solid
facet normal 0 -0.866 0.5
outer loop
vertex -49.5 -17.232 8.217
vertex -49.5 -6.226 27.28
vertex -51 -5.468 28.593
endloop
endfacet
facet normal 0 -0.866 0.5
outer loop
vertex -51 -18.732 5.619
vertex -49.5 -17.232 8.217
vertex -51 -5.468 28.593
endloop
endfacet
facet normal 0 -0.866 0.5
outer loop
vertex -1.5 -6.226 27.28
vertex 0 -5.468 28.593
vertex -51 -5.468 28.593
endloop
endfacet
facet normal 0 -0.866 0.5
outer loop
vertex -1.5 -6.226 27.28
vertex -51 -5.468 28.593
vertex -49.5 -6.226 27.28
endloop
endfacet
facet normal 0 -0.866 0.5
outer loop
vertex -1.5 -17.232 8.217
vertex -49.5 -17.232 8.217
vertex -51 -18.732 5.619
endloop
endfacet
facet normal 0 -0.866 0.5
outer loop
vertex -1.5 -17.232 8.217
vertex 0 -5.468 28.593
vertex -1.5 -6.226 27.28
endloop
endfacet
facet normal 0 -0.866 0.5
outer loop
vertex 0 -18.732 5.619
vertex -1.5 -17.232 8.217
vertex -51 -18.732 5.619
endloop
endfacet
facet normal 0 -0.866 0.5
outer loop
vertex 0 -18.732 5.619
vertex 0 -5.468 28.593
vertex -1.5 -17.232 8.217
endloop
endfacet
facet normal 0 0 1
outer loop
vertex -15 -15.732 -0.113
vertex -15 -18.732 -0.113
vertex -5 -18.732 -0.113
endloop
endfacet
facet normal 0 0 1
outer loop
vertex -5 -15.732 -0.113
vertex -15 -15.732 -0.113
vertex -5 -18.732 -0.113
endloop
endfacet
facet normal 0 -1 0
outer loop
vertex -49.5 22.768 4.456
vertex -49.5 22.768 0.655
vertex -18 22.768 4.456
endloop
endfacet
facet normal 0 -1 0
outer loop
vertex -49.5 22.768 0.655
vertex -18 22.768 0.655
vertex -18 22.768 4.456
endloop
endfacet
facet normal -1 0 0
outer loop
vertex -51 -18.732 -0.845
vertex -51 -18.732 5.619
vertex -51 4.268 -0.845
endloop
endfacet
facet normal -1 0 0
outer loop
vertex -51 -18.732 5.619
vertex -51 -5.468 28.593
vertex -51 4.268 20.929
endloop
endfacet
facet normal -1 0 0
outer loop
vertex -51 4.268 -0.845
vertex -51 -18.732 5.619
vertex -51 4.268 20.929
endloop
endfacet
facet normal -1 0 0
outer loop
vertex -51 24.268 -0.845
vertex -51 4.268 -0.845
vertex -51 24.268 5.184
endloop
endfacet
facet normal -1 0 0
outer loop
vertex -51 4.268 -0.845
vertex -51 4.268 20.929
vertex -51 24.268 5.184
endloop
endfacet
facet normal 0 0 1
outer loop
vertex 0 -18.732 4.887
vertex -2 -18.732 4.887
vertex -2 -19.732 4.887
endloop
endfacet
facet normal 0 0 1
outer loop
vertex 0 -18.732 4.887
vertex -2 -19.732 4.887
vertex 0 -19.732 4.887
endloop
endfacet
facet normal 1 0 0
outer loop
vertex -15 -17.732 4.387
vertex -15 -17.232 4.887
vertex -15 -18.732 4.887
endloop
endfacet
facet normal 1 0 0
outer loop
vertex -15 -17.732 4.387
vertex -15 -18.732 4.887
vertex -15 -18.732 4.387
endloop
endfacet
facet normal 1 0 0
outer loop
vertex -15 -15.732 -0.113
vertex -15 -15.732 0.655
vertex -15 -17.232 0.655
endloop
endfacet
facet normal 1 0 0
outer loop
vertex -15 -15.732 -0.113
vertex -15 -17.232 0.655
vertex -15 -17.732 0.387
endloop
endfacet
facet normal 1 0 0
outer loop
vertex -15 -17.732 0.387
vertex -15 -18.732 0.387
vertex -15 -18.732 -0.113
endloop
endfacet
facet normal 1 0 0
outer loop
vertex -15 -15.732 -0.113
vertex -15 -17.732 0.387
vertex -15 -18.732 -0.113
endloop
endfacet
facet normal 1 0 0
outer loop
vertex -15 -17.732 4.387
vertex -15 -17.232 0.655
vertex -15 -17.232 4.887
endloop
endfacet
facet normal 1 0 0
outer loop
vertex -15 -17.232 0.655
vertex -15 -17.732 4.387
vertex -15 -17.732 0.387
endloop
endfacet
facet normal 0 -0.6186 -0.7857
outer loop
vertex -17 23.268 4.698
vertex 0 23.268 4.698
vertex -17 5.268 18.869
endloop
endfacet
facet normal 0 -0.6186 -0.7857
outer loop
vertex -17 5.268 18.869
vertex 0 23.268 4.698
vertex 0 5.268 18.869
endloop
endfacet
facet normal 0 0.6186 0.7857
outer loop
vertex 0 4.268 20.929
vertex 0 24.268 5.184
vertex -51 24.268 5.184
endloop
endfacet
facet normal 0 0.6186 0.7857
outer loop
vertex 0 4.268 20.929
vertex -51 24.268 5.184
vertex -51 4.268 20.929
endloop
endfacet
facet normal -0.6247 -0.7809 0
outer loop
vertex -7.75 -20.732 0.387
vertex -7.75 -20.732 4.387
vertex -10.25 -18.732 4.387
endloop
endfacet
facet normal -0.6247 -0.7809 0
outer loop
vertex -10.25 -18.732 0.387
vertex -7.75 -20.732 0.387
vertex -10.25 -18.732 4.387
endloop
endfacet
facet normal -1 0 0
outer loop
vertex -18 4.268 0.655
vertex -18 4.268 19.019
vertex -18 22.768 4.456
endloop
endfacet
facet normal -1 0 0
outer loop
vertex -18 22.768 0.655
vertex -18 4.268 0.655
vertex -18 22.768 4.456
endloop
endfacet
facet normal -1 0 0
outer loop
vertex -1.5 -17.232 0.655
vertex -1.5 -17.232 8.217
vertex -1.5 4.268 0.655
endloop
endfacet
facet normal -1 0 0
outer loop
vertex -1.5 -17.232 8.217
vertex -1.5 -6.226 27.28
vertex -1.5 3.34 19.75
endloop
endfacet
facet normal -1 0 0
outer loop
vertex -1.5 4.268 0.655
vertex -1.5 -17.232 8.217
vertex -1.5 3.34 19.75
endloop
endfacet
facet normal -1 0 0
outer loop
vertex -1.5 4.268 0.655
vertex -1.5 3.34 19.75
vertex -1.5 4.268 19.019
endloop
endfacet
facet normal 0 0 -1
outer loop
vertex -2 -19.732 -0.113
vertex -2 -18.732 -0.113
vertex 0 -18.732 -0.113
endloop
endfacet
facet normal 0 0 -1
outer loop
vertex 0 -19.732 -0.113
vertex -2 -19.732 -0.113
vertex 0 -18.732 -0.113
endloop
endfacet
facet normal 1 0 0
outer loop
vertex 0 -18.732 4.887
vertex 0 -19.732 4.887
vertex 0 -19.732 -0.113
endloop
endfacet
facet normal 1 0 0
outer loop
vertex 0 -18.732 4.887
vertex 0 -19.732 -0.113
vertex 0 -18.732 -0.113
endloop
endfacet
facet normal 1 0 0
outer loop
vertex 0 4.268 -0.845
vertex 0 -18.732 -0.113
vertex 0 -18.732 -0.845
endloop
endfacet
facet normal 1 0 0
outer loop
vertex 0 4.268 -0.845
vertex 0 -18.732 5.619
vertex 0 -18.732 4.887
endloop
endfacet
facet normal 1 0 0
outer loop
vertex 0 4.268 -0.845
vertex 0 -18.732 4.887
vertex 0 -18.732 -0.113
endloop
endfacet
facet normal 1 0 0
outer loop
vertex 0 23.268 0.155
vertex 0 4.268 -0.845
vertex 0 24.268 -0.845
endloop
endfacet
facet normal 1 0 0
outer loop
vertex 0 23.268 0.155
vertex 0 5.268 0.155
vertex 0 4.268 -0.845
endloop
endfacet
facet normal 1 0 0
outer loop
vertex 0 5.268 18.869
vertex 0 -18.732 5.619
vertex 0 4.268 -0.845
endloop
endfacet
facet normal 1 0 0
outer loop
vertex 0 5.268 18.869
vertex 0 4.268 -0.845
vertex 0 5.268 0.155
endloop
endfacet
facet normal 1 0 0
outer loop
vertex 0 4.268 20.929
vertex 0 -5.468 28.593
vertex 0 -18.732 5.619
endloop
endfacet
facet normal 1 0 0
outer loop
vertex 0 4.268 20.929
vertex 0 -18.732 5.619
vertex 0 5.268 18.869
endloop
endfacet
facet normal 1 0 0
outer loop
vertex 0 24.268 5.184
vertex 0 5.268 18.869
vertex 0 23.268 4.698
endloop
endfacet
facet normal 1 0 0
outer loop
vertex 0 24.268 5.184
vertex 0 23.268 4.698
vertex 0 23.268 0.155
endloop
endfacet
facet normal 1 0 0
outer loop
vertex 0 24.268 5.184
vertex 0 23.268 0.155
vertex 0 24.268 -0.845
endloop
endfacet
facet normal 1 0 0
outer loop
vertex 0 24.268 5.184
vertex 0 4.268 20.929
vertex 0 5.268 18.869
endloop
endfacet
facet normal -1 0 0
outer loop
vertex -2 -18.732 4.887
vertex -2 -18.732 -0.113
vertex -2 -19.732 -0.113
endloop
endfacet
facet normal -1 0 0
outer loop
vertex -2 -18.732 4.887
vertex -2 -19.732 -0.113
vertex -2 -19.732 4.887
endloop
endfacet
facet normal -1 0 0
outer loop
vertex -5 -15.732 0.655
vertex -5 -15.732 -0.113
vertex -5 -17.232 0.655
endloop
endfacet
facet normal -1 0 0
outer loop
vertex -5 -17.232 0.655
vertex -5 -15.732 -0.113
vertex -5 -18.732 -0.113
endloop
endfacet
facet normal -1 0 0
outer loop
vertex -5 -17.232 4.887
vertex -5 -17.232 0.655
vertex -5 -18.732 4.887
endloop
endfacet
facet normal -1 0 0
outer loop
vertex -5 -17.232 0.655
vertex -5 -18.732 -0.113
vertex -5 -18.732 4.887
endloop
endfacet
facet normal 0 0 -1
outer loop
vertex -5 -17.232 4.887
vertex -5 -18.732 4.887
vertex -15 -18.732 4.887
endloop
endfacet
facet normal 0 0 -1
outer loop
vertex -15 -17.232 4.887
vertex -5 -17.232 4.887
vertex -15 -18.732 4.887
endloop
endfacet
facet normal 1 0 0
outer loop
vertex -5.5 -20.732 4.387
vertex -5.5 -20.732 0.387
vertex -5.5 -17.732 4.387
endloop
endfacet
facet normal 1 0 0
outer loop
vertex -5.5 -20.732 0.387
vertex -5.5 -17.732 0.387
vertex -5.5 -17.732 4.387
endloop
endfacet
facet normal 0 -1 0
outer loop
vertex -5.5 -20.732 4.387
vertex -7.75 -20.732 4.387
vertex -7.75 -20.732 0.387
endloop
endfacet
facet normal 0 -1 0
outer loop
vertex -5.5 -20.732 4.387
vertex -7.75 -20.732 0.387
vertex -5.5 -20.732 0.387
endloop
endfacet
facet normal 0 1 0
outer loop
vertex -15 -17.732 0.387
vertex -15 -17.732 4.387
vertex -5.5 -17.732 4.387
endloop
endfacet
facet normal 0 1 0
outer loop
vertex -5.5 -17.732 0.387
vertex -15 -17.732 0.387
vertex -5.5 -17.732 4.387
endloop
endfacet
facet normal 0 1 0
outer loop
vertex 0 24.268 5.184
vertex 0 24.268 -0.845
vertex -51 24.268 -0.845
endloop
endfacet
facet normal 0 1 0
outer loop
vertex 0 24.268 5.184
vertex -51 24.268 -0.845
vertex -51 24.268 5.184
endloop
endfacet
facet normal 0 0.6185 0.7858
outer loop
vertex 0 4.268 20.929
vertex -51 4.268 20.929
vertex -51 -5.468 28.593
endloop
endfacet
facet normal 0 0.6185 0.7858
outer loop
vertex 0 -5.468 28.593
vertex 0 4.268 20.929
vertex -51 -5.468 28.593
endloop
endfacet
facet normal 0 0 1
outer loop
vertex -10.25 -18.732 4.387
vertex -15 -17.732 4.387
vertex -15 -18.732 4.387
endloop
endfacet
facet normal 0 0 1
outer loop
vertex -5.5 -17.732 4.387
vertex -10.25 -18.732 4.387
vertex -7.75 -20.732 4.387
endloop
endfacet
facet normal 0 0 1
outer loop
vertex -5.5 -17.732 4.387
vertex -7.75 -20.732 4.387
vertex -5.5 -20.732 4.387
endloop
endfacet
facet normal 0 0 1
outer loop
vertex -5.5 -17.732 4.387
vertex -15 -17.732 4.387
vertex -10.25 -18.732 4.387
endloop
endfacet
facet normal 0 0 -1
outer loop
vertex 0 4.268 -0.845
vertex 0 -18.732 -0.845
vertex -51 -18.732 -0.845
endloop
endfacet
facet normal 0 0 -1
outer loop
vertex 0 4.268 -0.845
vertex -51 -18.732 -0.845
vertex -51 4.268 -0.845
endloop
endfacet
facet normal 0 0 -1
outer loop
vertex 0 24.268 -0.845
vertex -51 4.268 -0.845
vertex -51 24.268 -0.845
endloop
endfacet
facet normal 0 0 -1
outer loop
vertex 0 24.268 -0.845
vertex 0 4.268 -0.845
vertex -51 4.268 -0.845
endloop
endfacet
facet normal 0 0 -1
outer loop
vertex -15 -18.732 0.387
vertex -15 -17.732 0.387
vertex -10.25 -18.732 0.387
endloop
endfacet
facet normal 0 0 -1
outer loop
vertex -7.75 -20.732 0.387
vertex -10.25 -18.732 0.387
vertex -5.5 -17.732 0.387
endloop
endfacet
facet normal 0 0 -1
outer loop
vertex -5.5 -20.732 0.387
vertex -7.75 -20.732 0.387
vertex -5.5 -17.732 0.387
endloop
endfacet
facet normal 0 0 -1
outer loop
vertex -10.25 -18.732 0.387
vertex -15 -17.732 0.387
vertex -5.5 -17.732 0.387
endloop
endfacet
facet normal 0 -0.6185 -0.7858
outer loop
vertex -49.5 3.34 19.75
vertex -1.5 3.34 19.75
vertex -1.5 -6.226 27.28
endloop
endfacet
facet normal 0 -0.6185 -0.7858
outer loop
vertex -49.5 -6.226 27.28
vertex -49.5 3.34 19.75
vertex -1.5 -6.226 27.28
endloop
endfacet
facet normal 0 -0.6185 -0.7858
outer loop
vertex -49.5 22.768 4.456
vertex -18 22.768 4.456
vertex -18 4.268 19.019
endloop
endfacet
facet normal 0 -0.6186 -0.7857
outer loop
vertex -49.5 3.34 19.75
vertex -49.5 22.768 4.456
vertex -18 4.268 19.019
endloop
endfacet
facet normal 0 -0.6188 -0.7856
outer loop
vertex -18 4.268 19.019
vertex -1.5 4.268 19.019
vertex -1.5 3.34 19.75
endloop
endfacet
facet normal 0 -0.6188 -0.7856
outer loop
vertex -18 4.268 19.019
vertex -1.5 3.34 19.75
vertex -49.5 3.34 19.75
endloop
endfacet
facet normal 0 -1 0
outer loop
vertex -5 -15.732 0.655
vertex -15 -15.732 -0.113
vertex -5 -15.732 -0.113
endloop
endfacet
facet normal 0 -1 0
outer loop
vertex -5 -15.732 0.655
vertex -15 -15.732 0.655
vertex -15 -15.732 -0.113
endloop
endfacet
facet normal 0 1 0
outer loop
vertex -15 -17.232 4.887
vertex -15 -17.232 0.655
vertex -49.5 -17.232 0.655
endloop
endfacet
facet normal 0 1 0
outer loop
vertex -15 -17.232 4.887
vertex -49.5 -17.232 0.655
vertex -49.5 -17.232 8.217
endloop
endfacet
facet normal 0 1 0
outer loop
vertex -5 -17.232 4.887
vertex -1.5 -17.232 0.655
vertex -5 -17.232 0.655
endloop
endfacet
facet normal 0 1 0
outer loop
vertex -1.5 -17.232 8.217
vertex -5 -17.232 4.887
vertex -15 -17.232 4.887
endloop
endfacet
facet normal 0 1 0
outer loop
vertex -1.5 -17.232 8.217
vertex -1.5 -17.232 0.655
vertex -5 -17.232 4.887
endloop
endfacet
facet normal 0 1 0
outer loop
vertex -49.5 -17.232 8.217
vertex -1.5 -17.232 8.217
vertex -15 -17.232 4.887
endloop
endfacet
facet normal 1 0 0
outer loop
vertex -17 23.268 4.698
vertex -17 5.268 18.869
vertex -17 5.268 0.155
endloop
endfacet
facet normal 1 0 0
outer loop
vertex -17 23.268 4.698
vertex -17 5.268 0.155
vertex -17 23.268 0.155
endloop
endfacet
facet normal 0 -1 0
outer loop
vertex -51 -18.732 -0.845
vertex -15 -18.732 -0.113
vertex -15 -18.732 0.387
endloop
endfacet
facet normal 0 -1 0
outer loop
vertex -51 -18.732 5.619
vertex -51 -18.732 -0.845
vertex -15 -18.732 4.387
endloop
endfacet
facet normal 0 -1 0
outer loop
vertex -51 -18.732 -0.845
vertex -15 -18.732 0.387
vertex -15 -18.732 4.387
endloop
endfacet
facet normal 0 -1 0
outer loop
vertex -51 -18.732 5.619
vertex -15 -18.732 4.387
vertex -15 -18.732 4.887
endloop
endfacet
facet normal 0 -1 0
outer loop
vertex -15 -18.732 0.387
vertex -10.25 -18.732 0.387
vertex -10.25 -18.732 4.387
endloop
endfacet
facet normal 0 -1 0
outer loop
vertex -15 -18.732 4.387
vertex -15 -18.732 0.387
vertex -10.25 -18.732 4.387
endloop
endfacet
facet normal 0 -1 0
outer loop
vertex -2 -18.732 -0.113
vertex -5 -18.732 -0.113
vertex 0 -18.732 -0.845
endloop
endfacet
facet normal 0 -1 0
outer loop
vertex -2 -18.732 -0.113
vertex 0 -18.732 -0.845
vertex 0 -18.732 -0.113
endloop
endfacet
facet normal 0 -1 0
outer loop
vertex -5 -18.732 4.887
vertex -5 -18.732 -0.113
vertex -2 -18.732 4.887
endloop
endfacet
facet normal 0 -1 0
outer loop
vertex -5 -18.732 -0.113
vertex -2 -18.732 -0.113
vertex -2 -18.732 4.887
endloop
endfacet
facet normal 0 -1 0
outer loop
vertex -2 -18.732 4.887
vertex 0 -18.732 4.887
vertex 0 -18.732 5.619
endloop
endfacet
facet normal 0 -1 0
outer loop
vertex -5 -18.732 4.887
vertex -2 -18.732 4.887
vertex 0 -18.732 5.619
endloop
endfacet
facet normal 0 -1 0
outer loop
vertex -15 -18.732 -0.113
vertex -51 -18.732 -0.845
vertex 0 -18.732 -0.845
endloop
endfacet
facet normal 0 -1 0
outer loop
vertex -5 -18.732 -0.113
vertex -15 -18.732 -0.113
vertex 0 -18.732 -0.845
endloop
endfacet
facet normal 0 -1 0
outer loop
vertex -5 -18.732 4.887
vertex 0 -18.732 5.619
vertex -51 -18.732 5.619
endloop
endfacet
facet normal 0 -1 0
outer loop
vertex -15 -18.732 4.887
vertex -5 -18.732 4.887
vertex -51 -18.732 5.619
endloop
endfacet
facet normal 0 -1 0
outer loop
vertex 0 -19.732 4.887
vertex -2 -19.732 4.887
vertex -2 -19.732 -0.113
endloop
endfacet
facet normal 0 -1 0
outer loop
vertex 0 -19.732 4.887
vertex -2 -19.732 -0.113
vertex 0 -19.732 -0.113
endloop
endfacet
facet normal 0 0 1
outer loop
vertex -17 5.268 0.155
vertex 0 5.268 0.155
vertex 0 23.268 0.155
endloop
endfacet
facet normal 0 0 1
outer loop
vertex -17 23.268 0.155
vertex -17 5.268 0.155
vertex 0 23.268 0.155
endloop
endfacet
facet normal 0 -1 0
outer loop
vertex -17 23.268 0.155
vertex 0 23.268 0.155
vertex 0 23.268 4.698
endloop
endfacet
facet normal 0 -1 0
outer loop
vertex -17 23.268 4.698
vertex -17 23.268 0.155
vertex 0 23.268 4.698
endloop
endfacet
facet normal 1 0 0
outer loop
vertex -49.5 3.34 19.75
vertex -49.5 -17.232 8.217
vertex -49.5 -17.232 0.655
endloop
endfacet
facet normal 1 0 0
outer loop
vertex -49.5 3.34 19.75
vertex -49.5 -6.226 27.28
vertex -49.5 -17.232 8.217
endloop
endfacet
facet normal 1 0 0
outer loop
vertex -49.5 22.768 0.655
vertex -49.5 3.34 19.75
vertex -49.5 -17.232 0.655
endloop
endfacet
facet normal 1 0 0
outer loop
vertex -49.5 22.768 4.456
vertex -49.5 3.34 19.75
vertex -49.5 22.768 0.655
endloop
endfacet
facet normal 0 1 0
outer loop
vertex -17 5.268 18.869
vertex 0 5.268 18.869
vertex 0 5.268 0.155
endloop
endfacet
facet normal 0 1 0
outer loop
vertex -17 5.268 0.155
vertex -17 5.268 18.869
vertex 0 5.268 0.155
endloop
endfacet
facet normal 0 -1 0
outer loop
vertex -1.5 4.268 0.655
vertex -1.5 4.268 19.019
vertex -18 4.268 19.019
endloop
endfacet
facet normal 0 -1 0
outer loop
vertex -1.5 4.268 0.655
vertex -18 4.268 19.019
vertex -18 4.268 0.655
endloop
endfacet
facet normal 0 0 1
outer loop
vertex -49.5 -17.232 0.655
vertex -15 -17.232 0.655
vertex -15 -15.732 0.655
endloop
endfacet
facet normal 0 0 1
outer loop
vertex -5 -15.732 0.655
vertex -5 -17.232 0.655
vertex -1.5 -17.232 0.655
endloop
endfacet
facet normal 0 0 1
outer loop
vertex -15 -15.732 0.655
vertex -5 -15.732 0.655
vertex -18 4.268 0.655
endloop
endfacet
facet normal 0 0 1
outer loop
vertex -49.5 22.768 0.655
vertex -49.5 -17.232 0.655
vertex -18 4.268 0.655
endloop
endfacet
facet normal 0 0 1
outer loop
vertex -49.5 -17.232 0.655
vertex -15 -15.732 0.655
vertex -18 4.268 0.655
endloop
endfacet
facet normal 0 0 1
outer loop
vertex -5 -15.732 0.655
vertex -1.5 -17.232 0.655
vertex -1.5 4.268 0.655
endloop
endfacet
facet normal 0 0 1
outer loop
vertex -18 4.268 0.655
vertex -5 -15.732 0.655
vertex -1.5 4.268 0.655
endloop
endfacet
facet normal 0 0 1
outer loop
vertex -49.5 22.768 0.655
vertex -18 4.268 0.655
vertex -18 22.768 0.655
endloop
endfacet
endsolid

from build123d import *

# Parameters (mm, degrees)
F0_W          = 23
F0_H          = 6.4641016151
F1_DEPTH      = 51
F2_T          = -1.5
F3_DEPTH      = 18
F4_DEPTH      = 18
F5_T          = -1
F6_W          = 9.5
F6_H          = 4
F7_DEPTH      = 3
F8_DEPTH      = 1
F8_DEPTH_BACK = 2
F10_DEPTH     = 25
F6_W_2        = 2
F6_H_2        = 5
F11_DEPTH     = 1


with BuildPart() as f1:
    # F0 (on Right) → F1 (new body)
    with BuildSketch(Plane.YZ):
        with Locations((-7.2324005883, 2.3867851467)):
            Rectangle(F0_W, F0_H)
        Polygon((-5.4682982052, 28.5929351986), (-18.7324005883, 5.6188359543), (4.2675994117, 5.6188359543), (4.2675994117, 20.9285051598), align=None)
        Polygon((4.2675994117, 20.9285051598), (4.2675994117, 5.6188359543), (4.2675994117, -0.8452656608), (24.2675994117, -0.8452656608), (24.2675994117, 5.1838243087), align=None)
    extrude(amount=-F1_DEPTH)

    # F2
    f2_openings = [f1.faces().sort_by_distance(p)[0] for p in [
        (-25.5, -12.100349, 17.105886),
    ]]
    offset(amount=F2_T, openings=f2_openings)

    # F0 (on Right) → F3 (cut)
    with BuildSketch(Plane.YZ):
        Polygon((4.2675994117, 20.9285051598), (4.2675994117, 5.6188359543), (4.2675994117, -0.8452656608), (24.2675994117, -0.8452656608), (24.2675994117, 5.1838243087), align=None)
    extrude(amount=-F3_DEPTH, mode=Mode.SUBTRACT)

    # F6 (on face) → F7 (cut)
    with BuildSketch(Plane.XZ.offset(18.7324005883)):
        Polygon((-5, -0.1132148533), (-5, 4.8867851467), (-15, 4.8867851467), (-15, 4.3867851467), (-5.5, 4.3867851467), (-5.5, 0.3867851467), (-15, 0.3867851467), (-15, -0.1132148533), align=None)
        with Locations((-10.25, 2.3867851467)):
            Rectangle(F6_W, F6_H)
    extrude(amount=-F7_DEPTH, mode=Mode.SUBTRACT)

    # F6 (on face) → F8 (join, two sides)
    with BuildSketch(Plane.XZ.offset(18.7324005883)) as f8_sk:
        with Locations((-10.25, 2.3867851467)):
            Rectangle(F6_W, F6_H)
    extrude(amount=-F8_DEPTH)
    extrude(f8_sk.sketch, amount=F8_DEPTH_BACK)

    # F9 (on face) → F10 (cut)
    with BuildSketch(Plane.XY.offset(4.3867851467)):
        Polygon((-15, -18.7324005883), (-15, -20.7324005883), (-7.75, -20.7324005883), (-10.25, -18.7324005883), align=None)
    extrude(amount=-F10_DEPTH, mode=Mode.SUBTRACT)



with BuildPart() as f4:
    # F0 (on Right) → F4 (new body)
    with BuildSketch(Plane.YZ):
        Polygon((4.2675994117, 20.9285051598), (4.2675994117, 5.6188359543), (4.2675994117, -0.8452656608), (24.2675994117, -0.8452656608), (24.2675994117, 5.1838243087), align=None)
    extrude(amount=-F4_DEPTH)

    # F5
    f5_openings = [f4.faces().sort_by_distance(p)[0] for p in [
        (0, 12.379942, 6.848464),
    ]]
    offset(amount=F5_T, openings=f5_openings)


with BuildPart() as f1_1:
    add(f1.part)

    add(f4.part)  # F11 merges F4
    # F6 (on face) → F11 (join)
    with BuildSketch(Plane.XZ.offset(18.7324005883)):
        with Locations((-1, 2.3867851467)):
            Rectangle(F6_W_2, F6_H_2)
    extrude(amount=F11_DEPTH)


solid = f1_1.part
